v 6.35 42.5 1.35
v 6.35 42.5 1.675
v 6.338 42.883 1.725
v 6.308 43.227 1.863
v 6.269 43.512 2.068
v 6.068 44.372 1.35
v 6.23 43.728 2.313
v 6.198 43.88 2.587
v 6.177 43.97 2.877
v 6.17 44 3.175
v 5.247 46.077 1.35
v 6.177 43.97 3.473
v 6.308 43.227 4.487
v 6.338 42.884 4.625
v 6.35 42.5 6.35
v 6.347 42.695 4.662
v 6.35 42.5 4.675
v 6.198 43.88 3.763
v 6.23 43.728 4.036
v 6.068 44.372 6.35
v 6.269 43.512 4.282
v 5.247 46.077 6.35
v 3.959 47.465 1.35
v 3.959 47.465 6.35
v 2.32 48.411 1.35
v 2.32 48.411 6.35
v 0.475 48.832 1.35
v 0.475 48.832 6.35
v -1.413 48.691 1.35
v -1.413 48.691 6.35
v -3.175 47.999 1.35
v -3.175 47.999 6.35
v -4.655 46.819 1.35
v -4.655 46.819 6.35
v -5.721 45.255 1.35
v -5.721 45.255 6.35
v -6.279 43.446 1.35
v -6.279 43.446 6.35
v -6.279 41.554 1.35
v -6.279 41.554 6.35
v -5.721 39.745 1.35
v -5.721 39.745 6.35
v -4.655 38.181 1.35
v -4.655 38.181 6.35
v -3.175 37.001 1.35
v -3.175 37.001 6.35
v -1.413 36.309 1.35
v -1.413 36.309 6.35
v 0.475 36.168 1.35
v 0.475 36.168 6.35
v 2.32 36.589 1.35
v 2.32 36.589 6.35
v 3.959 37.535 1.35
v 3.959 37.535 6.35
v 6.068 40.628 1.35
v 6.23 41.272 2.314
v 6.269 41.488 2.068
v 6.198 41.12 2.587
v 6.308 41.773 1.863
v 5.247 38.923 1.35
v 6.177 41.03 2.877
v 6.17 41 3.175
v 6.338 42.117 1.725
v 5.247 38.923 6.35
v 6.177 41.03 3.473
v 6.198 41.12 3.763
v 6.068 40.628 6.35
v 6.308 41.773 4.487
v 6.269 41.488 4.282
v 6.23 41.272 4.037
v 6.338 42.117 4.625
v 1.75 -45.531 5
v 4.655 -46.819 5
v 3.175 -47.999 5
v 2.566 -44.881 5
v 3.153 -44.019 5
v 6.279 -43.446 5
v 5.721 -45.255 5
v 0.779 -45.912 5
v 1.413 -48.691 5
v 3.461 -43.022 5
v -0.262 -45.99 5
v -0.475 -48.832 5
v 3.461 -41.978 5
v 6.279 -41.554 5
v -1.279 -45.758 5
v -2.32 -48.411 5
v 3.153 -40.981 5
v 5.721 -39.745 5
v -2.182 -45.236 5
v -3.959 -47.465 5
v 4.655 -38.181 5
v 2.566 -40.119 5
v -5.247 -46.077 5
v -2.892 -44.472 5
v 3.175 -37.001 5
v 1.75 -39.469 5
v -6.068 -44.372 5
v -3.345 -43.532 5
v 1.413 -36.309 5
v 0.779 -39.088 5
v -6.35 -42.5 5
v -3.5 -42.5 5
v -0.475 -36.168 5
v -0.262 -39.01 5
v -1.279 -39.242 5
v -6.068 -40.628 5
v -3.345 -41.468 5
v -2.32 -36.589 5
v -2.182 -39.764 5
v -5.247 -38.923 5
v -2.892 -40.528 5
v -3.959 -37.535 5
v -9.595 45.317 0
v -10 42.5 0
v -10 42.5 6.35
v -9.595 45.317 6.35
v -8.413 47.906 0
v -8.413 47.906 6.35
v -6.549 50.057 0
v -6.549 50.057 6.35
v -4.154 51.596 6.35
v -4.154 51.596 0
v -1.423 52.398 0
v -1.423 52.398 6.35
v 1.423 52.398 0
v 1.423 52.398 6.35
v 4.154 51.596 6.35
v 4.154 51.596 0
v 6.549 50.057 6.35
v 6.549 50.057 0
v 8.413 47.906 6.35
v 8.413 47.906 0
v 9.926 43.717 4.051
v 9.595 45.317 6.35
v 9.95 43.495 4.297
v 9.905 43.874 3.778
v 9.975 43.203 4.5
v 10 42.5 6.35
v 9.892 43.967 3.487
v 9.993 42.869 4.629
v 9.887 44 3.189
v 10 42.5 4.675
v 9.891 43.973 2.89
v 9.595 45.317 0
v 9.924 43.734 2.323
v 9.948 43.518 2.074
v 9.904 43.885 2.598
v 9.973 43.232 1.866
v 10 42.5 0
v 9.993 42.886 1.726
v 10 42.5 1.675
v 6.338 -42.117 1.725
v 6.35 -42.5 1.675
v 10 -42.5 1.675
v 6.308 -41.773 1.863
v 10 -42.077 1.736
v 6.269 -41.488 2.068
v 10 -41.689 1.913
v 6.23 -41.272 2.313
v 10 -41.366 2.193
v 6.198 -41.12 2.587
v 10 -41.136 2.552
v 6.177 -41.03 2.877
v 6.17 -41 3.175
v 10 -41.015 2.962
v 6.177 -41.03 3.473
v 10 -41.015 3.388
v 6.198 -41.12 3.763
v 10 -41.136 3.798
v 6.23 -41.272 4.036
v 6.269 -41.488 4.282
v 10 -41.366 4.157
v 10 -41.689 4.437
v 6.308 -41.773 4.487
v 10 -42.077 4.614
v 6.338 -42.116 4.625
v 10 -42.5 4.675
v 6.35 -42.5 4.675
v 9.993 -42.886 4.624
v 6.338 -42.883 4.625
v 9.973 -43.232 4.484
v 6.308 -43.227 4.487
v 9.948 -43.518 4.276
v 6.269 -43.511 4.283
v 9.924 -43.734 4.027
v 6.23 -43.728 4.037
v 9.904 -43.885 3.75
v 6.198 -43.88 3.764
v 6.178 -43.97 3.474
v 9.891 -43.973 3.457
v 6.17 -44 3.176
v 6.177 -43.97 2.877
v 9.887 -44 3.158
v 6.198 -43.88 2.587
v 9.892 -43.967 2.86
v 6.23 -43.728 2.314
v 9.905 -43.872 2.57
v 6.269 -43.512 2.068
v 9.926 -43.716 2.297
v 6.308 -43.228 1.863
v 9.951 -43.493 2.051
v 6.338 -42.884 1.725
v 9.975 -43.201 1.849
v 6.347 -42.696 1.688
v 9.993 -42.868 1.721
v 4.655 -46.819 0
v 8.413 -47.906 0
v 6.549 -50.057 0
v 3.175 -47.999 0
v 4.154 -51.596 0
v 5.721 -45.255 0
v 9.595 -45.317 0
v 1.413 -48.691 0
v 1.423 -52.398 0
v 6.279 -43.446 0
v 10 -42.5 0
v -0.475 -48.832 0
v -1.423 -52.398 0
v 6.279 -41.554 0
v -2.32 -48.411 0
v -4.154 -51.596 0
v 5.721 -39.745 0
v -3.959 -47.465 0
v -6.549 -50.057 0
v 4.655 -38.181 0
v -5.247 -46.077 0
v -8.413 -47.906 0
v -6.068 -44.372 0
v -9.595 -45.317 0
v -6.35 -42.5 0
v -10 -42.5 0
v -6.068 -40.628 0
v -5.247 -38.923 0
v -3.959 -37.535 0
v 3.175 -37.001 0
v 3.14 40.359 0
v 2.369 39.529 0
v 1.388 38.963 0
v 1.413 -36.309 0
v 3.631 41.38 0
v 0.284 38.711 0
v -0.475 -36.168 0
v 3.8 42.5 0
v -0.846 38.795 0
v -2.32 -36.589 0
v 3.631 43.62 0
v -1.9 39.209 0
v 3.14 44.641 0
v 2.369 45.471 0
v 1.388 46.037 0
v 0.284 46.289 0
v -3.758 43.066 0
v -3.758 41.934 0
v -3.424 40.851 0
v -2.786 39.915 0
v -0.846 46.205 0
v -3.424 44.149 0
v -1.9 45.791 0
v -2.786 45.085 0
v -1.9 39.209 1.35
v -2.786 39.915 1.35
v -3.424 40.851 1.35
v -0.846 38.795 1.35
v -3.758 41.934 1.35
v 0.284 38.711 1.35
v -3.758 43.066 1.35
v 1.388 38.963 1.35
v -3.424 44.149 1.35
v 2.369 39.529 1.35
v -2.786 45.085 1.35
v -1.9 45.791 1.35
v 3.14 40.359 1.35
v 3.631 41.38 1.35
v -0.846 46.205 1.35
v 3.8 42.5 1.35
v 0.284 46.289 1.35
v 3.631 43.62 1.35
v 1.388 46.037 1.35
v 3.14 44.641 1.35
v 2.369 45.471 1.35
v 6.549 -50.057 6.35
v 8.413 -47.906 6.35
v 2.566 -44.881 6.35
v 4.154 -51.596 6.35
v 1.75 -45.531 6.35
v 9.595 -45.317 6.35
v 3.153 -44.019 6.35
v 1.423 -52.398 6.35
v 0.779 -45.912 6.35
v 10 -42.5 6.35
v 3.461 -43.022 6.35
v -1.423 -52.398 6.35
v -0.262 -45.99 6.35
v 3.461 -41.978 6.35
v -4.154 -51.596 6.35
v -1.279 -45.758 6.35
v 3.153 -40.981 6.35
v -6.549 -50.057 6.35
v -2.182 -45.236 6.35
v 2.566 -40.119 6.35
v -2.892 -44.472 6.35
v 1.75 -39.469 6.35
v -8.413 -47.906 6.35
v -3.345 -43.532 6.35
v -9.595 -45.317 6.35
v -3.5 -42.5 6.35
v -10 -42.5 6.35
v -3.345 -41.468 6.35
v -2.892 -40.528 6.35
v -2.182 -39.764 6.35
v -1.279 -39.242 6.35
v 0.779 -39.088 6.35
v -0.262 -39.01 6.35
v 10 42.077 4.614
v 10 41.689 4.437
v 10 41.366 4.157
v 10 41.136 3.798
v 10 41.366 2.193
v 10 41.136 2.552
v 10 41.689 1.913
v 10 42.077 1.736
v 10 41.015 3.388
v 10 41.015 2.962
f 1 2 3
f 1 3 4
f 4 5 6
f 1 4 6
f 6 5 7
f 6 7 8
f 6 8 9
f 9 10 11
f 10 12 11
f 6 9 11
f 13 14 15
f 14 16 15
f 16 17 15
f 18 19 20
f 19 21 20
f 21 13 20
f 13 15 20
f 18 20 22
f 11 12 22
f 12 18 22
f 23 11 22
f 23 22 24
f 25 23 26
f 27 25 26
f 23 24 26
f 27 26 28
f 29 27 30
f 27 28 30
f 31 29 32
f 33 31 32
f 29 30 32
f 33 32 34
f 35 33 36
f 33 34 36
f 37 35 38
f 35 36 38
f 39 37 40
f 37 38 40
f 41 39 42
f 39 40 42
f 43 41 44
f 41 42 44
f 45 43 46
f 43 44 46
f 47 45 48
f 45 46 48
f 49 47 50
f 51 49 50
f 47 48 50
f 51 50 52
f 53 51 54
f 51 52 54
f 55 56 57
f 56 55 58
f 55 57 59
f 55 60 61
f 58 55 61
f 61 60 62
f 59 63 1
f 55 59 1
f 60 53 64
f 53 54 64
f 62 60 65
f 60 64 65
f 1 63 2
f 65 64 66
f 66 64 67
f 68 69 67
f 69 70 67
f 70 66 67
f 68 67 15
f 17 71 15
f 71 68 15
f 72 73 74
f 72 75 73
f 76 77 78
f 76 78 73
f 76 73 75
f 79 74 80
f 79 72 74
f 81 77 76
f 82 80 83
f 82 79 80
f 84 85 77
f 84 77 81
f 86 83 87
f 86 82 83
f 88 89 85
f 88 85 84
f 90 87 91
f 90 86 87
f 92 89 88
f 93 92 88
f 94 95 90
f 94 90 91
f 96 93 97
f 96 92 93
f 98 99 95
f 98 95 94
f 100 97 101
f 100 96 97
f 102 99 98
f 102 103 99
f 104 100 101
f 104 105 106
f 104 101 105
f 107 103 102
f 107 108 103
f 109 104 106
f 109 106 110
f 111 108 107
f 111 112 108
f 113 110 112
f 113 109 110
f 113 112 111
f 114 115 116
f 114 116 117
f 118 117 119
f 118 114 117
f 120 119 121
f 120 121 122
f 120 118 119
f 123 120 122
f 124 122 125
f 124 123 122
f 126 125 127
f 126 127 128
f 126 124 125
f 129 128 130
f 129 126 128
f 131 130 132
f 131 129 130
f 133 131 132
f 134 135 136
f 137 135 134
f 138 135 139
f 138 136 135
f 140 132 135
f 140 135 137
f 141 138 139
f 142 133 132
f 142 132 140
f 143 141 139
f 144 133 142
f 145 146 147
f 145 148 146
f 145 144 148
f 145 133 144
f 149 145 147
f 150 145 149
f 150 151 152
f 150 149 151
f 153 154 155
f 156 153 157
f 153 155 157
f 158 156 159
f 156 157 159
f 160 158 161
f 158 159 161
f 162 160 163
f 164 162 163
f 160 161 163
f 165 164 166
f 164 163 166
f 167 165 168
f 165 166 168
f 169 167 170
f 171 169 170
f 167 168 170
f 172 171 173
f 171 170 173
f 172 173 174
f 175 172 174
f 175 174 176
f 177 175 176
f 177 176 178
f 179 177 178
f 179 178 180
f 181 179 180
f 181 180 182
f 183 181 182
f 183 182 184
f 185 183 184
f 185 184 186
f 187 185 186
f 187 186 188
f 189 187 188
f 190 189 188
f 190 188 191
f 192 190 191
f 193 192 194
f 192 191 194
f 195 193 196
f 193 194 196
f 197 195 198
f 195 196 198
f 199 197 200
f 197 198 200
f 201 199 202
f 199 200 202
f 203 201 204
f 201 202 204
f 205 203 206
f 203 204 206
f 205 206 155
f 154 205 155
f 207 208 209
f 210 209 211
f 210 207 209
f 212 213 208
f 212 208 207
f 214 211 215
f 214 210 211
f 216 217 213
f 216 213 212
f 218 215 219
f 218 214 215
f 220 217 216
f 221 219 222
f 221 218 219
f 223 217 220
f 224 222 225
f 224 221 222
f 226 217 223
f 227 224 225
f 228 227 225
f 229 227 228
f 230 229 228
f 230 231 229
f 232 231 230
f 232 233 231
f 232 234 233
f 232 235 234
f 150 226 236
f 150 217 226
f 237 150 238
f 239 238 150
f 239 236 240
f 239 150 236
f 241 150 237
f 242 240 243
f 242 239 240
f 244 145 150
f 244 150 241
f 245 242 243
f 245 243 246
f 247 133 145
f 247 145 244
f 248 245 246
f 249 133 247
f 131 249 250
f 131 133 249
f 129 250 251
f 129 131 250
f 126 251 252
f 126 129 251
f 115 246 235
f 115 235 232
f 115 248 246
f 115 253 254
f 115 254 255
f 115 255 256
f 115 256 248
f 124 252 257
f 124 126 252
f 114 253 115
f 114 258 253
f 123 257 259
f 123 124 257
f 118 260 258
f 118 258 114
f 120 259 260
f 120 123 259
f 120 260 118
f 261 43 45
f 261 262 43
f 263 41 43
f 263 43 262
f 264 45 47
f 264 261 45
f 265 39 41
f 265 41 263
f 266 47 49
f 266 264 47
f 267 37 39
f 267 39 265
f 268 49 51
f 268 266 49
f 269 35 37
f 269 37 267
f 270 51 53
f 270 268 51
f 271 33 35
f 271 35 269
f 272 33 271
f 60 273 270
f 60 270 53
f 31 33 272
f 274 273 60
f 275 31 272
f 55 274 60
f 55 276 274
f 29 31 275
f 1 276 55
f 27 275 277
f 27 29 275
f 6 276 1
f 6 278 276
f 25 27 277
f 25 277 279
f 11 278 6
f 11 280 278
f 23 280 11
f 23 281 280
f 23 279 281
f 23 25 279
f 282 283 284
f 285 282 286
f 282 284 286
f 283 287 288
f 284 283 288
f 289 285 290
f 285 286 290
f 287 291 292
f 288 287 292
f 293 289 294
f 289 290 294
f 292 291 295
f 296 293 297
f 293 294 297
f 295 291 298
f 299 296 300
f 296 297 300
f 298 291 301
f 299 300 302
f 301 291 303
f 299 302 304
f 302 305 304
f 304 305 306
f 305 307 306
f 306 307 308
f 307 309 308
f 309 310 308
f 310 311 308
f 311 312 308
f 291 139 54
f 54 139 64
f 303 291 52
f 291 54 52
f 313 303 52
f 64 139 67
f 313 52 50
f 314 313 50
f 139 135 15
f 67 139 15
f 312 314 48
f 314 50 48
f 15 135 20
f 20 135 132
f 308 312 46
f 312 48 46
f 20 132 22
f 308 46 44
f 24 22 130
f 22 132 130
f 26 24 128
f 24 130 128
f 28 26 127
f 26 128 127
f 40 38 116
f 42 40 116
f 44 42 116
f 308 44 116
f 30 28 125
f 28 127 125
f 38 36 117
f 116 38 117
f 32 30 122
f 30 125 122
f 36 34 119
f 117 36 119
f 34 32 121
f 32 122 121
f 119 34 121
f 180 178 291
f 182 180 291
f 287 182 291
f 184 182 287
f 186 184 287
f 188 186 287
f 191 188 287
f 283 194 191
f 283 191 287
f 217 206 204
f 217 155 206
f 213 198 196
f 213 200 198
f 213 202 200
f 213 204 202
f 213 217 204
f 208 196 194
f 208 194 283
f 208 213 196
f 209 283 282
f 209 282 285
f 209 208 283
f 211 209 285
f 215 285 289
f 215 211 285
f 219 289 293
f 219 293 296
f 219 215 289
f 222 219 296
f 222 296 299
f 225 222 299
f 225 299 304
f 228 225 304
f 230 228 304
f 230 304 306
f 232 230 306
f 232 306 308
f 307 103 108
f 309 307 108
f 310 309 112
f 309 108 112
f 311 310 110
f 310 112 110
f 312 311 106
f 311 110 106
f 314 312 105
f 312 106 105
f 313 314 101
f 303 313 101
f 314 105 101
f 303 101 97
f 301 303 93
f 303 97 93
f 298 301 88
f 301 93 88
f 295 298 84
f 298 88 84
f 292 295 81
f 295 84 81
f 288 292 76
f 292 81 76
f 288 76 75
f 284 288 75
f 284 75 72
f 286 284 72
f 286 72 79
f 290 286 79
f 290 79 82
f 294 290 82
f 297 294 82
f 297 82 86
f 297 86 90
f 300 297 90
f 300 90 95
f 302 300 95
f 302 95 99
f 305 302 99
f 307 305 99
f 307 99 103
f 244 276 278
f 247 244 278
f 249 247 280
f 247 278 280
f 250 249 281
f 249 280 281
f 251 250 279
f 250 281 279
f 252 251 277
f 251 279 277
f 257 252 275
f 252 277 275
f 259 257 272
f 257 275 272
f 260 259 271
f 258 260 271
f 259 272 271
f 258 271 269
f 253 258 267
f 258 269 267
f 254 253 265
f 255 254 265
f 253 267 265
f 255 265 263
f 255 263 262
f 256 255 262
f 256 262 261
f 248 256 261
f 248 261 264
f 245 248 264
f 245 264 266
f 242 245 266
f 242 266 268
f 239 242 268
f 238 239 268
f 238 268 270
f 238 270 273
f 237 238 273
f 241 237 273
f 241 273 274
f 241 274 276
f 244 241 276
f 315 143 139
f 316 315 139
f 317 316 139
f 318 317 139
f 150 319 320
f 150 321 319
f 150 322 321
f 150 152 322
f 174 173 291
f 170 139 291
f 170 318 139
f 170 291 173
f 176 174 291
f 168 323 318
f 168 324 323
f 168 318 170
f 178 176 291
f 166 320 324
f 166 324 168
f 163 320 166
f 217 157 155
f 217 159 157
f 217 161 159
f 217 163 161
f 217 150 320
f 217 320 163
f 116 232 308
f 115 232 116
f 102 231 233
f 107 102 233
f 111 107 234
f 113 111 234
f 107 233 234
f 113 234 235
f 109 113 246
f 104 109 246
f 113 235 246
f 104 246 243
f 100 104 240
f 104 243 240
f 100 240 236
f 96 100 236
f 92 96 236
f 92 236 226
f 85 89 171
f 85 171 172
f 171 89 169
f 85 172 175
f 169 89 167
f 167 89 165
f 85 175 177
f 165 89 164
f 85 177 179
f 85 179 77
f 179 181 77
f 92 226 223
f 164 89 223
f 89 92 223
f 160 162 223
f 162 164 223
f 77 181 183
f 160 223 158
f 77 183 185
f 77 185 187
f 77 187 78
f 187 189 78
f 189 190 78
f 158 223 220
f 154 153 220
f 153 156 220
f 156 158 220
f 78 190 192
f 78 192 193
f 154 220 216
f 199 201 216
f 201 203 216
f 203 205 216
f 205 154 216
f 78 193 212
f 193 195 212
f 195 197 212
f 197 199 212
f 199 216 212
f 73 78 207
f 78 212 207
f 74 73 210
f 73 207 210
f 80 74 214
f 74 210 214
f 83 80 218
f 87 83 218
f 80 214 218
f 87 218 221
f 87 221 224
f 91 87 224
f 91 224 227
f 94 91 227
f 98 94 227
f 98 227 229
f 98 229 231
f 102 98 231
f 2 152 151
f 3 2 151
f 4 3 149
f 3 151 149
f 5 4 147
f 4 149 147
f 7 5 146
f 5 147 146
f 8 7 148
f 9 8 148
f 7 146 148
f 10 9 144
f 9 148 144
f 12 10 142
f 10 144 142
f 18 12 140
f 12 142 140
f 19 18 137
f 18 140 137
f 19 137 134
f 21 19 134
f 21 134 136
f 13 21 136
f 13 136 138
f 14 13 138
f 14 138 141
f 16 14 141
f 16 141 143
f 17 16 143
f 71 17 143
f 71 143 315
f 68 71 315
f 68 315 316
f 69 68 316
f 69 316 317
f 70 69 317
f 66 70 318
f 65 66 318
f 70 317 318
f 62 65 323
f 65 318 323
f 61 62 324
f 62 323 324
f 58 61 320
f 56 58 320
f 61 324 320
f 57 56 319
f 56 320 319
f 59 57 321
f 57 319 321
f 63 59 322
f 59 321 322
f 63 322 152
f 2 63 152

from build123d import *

# Parameters (mm, degrees)
SALIENTE_EXTRUIR1_DEPTH = 6.35
CROQUIS2_R              = 6.35
CORTAR_EXTRUIR1_DEPTH   = 5
CROQUIS3_R              = 3.8
CORTAR_EXTRUIR2_DEPTH   = 2.35
CROQUIS6_R              = 1.5
CORTAR_EXTRUIR5_DEPTH   = 5
CROQUIS7_R              = 6.35
CORTAR_EXTRUIR6_DEPTH   = 5
CROQUIS8_R              = 3.5
CORTAR_EXTRUIR7_DEPTH   = 5
CROQUIS9_R              = 1.5
CORTAR_EXTRUIR8_DEPTH   = 5


with BuildPart() as part:
    # Croquis1 → Saliente-Extruir1 (new body)
    with BuildSketch(Plane.XY):
        with BuildLine():
            Line((10, 42.5), (10, -42.5))
            ThreePointArc((10, -42.5), (0, -52.5), (-10, -42.5))
            Line((-10, -42.5), (-10, 42.5))
            ThreePointArc((-10, 42.5), (0, 52.5), (10, 42.5))
        make_face()
    extrude(amount=SALIENTE_EXTRUIR1_DEPTH)

    # Croquis2 → Cortar-Extruir1 (cut)
    with BuildSketch(Plane.XY.offset(6.35)):
        with Locations((0, 42.5)):
            Circle(CROQUIS2_R)
    extrude(amount=-CORTAR_EXTRUIR1_DEPTH, mode=Mode.SUBTRACT)

    # Croquis3 → Cortar-Extruir2 (cut, through all)
    with BuildSketch(Plane.XY.offset(1.35)):
        with Locations((0, 42.5)):
            Circle(CROQUIS3_R)
    extrude(amount=-CORTAR_EXTRUIR2_DEPTH, mode=Mode.SUBTRACT)

    # Croquis6 → Cortar-Extruir5 (cut)
    with BuildSketch(Plane(origin=(10, 0, 0), x_dir=(0, 0, -1), z_dir=(1, 0, 0))):
        with Locations((-3.175, 42.5)):
            Circle(CROQUIS6_R)
    extrude(amount=-CORTAR_EXTRUIR5_DEPTH, mode=Mode.SUBTRACT)

    # Croquis7 → Cortar-Extruir6 (cut)
    with BuildSketch(Plane(origin=(0, 0, 0), x_dir=(-1, 0, 0), z_dir=(0, 0, -1))):
        with Locations((0, -42.5)):
            Circle(CROQUIS7_R)
    extrude(amount=-CORTAR_EXTRUIR6_DEPTH, mode=Mode.SUBTRACT)

    # Croquis8 → Cortar-Extruir7 (cut)
    with BuildSketch(Plane(origin=(0, 0, 5), x_dir=(-1, 0, 0), z_dir=(0, 0, -1))):
        with Locations((0, -42.5)):
            Circle(CROQUIS8_R)
    extrude(amount=-CORTAR_EXTRUIR7_DEPTH, mode=Mode.SUBTRACT)

    # Croquis9 → Cortar-Extruir8 (cut)
    with BuildSketch(Plane(origin=(10, 0, 0), x_dir=(0, 0, -1), z_dir=(1, 0, 0))):
        with Locations((-3.175, -42.5)):
            Circle(CROQUIS9_R)
    extrude(amount=-CORTAR_EXTRUIR8_DEPTH, mode=Mode.SUBTRACT)


solid = part.part
